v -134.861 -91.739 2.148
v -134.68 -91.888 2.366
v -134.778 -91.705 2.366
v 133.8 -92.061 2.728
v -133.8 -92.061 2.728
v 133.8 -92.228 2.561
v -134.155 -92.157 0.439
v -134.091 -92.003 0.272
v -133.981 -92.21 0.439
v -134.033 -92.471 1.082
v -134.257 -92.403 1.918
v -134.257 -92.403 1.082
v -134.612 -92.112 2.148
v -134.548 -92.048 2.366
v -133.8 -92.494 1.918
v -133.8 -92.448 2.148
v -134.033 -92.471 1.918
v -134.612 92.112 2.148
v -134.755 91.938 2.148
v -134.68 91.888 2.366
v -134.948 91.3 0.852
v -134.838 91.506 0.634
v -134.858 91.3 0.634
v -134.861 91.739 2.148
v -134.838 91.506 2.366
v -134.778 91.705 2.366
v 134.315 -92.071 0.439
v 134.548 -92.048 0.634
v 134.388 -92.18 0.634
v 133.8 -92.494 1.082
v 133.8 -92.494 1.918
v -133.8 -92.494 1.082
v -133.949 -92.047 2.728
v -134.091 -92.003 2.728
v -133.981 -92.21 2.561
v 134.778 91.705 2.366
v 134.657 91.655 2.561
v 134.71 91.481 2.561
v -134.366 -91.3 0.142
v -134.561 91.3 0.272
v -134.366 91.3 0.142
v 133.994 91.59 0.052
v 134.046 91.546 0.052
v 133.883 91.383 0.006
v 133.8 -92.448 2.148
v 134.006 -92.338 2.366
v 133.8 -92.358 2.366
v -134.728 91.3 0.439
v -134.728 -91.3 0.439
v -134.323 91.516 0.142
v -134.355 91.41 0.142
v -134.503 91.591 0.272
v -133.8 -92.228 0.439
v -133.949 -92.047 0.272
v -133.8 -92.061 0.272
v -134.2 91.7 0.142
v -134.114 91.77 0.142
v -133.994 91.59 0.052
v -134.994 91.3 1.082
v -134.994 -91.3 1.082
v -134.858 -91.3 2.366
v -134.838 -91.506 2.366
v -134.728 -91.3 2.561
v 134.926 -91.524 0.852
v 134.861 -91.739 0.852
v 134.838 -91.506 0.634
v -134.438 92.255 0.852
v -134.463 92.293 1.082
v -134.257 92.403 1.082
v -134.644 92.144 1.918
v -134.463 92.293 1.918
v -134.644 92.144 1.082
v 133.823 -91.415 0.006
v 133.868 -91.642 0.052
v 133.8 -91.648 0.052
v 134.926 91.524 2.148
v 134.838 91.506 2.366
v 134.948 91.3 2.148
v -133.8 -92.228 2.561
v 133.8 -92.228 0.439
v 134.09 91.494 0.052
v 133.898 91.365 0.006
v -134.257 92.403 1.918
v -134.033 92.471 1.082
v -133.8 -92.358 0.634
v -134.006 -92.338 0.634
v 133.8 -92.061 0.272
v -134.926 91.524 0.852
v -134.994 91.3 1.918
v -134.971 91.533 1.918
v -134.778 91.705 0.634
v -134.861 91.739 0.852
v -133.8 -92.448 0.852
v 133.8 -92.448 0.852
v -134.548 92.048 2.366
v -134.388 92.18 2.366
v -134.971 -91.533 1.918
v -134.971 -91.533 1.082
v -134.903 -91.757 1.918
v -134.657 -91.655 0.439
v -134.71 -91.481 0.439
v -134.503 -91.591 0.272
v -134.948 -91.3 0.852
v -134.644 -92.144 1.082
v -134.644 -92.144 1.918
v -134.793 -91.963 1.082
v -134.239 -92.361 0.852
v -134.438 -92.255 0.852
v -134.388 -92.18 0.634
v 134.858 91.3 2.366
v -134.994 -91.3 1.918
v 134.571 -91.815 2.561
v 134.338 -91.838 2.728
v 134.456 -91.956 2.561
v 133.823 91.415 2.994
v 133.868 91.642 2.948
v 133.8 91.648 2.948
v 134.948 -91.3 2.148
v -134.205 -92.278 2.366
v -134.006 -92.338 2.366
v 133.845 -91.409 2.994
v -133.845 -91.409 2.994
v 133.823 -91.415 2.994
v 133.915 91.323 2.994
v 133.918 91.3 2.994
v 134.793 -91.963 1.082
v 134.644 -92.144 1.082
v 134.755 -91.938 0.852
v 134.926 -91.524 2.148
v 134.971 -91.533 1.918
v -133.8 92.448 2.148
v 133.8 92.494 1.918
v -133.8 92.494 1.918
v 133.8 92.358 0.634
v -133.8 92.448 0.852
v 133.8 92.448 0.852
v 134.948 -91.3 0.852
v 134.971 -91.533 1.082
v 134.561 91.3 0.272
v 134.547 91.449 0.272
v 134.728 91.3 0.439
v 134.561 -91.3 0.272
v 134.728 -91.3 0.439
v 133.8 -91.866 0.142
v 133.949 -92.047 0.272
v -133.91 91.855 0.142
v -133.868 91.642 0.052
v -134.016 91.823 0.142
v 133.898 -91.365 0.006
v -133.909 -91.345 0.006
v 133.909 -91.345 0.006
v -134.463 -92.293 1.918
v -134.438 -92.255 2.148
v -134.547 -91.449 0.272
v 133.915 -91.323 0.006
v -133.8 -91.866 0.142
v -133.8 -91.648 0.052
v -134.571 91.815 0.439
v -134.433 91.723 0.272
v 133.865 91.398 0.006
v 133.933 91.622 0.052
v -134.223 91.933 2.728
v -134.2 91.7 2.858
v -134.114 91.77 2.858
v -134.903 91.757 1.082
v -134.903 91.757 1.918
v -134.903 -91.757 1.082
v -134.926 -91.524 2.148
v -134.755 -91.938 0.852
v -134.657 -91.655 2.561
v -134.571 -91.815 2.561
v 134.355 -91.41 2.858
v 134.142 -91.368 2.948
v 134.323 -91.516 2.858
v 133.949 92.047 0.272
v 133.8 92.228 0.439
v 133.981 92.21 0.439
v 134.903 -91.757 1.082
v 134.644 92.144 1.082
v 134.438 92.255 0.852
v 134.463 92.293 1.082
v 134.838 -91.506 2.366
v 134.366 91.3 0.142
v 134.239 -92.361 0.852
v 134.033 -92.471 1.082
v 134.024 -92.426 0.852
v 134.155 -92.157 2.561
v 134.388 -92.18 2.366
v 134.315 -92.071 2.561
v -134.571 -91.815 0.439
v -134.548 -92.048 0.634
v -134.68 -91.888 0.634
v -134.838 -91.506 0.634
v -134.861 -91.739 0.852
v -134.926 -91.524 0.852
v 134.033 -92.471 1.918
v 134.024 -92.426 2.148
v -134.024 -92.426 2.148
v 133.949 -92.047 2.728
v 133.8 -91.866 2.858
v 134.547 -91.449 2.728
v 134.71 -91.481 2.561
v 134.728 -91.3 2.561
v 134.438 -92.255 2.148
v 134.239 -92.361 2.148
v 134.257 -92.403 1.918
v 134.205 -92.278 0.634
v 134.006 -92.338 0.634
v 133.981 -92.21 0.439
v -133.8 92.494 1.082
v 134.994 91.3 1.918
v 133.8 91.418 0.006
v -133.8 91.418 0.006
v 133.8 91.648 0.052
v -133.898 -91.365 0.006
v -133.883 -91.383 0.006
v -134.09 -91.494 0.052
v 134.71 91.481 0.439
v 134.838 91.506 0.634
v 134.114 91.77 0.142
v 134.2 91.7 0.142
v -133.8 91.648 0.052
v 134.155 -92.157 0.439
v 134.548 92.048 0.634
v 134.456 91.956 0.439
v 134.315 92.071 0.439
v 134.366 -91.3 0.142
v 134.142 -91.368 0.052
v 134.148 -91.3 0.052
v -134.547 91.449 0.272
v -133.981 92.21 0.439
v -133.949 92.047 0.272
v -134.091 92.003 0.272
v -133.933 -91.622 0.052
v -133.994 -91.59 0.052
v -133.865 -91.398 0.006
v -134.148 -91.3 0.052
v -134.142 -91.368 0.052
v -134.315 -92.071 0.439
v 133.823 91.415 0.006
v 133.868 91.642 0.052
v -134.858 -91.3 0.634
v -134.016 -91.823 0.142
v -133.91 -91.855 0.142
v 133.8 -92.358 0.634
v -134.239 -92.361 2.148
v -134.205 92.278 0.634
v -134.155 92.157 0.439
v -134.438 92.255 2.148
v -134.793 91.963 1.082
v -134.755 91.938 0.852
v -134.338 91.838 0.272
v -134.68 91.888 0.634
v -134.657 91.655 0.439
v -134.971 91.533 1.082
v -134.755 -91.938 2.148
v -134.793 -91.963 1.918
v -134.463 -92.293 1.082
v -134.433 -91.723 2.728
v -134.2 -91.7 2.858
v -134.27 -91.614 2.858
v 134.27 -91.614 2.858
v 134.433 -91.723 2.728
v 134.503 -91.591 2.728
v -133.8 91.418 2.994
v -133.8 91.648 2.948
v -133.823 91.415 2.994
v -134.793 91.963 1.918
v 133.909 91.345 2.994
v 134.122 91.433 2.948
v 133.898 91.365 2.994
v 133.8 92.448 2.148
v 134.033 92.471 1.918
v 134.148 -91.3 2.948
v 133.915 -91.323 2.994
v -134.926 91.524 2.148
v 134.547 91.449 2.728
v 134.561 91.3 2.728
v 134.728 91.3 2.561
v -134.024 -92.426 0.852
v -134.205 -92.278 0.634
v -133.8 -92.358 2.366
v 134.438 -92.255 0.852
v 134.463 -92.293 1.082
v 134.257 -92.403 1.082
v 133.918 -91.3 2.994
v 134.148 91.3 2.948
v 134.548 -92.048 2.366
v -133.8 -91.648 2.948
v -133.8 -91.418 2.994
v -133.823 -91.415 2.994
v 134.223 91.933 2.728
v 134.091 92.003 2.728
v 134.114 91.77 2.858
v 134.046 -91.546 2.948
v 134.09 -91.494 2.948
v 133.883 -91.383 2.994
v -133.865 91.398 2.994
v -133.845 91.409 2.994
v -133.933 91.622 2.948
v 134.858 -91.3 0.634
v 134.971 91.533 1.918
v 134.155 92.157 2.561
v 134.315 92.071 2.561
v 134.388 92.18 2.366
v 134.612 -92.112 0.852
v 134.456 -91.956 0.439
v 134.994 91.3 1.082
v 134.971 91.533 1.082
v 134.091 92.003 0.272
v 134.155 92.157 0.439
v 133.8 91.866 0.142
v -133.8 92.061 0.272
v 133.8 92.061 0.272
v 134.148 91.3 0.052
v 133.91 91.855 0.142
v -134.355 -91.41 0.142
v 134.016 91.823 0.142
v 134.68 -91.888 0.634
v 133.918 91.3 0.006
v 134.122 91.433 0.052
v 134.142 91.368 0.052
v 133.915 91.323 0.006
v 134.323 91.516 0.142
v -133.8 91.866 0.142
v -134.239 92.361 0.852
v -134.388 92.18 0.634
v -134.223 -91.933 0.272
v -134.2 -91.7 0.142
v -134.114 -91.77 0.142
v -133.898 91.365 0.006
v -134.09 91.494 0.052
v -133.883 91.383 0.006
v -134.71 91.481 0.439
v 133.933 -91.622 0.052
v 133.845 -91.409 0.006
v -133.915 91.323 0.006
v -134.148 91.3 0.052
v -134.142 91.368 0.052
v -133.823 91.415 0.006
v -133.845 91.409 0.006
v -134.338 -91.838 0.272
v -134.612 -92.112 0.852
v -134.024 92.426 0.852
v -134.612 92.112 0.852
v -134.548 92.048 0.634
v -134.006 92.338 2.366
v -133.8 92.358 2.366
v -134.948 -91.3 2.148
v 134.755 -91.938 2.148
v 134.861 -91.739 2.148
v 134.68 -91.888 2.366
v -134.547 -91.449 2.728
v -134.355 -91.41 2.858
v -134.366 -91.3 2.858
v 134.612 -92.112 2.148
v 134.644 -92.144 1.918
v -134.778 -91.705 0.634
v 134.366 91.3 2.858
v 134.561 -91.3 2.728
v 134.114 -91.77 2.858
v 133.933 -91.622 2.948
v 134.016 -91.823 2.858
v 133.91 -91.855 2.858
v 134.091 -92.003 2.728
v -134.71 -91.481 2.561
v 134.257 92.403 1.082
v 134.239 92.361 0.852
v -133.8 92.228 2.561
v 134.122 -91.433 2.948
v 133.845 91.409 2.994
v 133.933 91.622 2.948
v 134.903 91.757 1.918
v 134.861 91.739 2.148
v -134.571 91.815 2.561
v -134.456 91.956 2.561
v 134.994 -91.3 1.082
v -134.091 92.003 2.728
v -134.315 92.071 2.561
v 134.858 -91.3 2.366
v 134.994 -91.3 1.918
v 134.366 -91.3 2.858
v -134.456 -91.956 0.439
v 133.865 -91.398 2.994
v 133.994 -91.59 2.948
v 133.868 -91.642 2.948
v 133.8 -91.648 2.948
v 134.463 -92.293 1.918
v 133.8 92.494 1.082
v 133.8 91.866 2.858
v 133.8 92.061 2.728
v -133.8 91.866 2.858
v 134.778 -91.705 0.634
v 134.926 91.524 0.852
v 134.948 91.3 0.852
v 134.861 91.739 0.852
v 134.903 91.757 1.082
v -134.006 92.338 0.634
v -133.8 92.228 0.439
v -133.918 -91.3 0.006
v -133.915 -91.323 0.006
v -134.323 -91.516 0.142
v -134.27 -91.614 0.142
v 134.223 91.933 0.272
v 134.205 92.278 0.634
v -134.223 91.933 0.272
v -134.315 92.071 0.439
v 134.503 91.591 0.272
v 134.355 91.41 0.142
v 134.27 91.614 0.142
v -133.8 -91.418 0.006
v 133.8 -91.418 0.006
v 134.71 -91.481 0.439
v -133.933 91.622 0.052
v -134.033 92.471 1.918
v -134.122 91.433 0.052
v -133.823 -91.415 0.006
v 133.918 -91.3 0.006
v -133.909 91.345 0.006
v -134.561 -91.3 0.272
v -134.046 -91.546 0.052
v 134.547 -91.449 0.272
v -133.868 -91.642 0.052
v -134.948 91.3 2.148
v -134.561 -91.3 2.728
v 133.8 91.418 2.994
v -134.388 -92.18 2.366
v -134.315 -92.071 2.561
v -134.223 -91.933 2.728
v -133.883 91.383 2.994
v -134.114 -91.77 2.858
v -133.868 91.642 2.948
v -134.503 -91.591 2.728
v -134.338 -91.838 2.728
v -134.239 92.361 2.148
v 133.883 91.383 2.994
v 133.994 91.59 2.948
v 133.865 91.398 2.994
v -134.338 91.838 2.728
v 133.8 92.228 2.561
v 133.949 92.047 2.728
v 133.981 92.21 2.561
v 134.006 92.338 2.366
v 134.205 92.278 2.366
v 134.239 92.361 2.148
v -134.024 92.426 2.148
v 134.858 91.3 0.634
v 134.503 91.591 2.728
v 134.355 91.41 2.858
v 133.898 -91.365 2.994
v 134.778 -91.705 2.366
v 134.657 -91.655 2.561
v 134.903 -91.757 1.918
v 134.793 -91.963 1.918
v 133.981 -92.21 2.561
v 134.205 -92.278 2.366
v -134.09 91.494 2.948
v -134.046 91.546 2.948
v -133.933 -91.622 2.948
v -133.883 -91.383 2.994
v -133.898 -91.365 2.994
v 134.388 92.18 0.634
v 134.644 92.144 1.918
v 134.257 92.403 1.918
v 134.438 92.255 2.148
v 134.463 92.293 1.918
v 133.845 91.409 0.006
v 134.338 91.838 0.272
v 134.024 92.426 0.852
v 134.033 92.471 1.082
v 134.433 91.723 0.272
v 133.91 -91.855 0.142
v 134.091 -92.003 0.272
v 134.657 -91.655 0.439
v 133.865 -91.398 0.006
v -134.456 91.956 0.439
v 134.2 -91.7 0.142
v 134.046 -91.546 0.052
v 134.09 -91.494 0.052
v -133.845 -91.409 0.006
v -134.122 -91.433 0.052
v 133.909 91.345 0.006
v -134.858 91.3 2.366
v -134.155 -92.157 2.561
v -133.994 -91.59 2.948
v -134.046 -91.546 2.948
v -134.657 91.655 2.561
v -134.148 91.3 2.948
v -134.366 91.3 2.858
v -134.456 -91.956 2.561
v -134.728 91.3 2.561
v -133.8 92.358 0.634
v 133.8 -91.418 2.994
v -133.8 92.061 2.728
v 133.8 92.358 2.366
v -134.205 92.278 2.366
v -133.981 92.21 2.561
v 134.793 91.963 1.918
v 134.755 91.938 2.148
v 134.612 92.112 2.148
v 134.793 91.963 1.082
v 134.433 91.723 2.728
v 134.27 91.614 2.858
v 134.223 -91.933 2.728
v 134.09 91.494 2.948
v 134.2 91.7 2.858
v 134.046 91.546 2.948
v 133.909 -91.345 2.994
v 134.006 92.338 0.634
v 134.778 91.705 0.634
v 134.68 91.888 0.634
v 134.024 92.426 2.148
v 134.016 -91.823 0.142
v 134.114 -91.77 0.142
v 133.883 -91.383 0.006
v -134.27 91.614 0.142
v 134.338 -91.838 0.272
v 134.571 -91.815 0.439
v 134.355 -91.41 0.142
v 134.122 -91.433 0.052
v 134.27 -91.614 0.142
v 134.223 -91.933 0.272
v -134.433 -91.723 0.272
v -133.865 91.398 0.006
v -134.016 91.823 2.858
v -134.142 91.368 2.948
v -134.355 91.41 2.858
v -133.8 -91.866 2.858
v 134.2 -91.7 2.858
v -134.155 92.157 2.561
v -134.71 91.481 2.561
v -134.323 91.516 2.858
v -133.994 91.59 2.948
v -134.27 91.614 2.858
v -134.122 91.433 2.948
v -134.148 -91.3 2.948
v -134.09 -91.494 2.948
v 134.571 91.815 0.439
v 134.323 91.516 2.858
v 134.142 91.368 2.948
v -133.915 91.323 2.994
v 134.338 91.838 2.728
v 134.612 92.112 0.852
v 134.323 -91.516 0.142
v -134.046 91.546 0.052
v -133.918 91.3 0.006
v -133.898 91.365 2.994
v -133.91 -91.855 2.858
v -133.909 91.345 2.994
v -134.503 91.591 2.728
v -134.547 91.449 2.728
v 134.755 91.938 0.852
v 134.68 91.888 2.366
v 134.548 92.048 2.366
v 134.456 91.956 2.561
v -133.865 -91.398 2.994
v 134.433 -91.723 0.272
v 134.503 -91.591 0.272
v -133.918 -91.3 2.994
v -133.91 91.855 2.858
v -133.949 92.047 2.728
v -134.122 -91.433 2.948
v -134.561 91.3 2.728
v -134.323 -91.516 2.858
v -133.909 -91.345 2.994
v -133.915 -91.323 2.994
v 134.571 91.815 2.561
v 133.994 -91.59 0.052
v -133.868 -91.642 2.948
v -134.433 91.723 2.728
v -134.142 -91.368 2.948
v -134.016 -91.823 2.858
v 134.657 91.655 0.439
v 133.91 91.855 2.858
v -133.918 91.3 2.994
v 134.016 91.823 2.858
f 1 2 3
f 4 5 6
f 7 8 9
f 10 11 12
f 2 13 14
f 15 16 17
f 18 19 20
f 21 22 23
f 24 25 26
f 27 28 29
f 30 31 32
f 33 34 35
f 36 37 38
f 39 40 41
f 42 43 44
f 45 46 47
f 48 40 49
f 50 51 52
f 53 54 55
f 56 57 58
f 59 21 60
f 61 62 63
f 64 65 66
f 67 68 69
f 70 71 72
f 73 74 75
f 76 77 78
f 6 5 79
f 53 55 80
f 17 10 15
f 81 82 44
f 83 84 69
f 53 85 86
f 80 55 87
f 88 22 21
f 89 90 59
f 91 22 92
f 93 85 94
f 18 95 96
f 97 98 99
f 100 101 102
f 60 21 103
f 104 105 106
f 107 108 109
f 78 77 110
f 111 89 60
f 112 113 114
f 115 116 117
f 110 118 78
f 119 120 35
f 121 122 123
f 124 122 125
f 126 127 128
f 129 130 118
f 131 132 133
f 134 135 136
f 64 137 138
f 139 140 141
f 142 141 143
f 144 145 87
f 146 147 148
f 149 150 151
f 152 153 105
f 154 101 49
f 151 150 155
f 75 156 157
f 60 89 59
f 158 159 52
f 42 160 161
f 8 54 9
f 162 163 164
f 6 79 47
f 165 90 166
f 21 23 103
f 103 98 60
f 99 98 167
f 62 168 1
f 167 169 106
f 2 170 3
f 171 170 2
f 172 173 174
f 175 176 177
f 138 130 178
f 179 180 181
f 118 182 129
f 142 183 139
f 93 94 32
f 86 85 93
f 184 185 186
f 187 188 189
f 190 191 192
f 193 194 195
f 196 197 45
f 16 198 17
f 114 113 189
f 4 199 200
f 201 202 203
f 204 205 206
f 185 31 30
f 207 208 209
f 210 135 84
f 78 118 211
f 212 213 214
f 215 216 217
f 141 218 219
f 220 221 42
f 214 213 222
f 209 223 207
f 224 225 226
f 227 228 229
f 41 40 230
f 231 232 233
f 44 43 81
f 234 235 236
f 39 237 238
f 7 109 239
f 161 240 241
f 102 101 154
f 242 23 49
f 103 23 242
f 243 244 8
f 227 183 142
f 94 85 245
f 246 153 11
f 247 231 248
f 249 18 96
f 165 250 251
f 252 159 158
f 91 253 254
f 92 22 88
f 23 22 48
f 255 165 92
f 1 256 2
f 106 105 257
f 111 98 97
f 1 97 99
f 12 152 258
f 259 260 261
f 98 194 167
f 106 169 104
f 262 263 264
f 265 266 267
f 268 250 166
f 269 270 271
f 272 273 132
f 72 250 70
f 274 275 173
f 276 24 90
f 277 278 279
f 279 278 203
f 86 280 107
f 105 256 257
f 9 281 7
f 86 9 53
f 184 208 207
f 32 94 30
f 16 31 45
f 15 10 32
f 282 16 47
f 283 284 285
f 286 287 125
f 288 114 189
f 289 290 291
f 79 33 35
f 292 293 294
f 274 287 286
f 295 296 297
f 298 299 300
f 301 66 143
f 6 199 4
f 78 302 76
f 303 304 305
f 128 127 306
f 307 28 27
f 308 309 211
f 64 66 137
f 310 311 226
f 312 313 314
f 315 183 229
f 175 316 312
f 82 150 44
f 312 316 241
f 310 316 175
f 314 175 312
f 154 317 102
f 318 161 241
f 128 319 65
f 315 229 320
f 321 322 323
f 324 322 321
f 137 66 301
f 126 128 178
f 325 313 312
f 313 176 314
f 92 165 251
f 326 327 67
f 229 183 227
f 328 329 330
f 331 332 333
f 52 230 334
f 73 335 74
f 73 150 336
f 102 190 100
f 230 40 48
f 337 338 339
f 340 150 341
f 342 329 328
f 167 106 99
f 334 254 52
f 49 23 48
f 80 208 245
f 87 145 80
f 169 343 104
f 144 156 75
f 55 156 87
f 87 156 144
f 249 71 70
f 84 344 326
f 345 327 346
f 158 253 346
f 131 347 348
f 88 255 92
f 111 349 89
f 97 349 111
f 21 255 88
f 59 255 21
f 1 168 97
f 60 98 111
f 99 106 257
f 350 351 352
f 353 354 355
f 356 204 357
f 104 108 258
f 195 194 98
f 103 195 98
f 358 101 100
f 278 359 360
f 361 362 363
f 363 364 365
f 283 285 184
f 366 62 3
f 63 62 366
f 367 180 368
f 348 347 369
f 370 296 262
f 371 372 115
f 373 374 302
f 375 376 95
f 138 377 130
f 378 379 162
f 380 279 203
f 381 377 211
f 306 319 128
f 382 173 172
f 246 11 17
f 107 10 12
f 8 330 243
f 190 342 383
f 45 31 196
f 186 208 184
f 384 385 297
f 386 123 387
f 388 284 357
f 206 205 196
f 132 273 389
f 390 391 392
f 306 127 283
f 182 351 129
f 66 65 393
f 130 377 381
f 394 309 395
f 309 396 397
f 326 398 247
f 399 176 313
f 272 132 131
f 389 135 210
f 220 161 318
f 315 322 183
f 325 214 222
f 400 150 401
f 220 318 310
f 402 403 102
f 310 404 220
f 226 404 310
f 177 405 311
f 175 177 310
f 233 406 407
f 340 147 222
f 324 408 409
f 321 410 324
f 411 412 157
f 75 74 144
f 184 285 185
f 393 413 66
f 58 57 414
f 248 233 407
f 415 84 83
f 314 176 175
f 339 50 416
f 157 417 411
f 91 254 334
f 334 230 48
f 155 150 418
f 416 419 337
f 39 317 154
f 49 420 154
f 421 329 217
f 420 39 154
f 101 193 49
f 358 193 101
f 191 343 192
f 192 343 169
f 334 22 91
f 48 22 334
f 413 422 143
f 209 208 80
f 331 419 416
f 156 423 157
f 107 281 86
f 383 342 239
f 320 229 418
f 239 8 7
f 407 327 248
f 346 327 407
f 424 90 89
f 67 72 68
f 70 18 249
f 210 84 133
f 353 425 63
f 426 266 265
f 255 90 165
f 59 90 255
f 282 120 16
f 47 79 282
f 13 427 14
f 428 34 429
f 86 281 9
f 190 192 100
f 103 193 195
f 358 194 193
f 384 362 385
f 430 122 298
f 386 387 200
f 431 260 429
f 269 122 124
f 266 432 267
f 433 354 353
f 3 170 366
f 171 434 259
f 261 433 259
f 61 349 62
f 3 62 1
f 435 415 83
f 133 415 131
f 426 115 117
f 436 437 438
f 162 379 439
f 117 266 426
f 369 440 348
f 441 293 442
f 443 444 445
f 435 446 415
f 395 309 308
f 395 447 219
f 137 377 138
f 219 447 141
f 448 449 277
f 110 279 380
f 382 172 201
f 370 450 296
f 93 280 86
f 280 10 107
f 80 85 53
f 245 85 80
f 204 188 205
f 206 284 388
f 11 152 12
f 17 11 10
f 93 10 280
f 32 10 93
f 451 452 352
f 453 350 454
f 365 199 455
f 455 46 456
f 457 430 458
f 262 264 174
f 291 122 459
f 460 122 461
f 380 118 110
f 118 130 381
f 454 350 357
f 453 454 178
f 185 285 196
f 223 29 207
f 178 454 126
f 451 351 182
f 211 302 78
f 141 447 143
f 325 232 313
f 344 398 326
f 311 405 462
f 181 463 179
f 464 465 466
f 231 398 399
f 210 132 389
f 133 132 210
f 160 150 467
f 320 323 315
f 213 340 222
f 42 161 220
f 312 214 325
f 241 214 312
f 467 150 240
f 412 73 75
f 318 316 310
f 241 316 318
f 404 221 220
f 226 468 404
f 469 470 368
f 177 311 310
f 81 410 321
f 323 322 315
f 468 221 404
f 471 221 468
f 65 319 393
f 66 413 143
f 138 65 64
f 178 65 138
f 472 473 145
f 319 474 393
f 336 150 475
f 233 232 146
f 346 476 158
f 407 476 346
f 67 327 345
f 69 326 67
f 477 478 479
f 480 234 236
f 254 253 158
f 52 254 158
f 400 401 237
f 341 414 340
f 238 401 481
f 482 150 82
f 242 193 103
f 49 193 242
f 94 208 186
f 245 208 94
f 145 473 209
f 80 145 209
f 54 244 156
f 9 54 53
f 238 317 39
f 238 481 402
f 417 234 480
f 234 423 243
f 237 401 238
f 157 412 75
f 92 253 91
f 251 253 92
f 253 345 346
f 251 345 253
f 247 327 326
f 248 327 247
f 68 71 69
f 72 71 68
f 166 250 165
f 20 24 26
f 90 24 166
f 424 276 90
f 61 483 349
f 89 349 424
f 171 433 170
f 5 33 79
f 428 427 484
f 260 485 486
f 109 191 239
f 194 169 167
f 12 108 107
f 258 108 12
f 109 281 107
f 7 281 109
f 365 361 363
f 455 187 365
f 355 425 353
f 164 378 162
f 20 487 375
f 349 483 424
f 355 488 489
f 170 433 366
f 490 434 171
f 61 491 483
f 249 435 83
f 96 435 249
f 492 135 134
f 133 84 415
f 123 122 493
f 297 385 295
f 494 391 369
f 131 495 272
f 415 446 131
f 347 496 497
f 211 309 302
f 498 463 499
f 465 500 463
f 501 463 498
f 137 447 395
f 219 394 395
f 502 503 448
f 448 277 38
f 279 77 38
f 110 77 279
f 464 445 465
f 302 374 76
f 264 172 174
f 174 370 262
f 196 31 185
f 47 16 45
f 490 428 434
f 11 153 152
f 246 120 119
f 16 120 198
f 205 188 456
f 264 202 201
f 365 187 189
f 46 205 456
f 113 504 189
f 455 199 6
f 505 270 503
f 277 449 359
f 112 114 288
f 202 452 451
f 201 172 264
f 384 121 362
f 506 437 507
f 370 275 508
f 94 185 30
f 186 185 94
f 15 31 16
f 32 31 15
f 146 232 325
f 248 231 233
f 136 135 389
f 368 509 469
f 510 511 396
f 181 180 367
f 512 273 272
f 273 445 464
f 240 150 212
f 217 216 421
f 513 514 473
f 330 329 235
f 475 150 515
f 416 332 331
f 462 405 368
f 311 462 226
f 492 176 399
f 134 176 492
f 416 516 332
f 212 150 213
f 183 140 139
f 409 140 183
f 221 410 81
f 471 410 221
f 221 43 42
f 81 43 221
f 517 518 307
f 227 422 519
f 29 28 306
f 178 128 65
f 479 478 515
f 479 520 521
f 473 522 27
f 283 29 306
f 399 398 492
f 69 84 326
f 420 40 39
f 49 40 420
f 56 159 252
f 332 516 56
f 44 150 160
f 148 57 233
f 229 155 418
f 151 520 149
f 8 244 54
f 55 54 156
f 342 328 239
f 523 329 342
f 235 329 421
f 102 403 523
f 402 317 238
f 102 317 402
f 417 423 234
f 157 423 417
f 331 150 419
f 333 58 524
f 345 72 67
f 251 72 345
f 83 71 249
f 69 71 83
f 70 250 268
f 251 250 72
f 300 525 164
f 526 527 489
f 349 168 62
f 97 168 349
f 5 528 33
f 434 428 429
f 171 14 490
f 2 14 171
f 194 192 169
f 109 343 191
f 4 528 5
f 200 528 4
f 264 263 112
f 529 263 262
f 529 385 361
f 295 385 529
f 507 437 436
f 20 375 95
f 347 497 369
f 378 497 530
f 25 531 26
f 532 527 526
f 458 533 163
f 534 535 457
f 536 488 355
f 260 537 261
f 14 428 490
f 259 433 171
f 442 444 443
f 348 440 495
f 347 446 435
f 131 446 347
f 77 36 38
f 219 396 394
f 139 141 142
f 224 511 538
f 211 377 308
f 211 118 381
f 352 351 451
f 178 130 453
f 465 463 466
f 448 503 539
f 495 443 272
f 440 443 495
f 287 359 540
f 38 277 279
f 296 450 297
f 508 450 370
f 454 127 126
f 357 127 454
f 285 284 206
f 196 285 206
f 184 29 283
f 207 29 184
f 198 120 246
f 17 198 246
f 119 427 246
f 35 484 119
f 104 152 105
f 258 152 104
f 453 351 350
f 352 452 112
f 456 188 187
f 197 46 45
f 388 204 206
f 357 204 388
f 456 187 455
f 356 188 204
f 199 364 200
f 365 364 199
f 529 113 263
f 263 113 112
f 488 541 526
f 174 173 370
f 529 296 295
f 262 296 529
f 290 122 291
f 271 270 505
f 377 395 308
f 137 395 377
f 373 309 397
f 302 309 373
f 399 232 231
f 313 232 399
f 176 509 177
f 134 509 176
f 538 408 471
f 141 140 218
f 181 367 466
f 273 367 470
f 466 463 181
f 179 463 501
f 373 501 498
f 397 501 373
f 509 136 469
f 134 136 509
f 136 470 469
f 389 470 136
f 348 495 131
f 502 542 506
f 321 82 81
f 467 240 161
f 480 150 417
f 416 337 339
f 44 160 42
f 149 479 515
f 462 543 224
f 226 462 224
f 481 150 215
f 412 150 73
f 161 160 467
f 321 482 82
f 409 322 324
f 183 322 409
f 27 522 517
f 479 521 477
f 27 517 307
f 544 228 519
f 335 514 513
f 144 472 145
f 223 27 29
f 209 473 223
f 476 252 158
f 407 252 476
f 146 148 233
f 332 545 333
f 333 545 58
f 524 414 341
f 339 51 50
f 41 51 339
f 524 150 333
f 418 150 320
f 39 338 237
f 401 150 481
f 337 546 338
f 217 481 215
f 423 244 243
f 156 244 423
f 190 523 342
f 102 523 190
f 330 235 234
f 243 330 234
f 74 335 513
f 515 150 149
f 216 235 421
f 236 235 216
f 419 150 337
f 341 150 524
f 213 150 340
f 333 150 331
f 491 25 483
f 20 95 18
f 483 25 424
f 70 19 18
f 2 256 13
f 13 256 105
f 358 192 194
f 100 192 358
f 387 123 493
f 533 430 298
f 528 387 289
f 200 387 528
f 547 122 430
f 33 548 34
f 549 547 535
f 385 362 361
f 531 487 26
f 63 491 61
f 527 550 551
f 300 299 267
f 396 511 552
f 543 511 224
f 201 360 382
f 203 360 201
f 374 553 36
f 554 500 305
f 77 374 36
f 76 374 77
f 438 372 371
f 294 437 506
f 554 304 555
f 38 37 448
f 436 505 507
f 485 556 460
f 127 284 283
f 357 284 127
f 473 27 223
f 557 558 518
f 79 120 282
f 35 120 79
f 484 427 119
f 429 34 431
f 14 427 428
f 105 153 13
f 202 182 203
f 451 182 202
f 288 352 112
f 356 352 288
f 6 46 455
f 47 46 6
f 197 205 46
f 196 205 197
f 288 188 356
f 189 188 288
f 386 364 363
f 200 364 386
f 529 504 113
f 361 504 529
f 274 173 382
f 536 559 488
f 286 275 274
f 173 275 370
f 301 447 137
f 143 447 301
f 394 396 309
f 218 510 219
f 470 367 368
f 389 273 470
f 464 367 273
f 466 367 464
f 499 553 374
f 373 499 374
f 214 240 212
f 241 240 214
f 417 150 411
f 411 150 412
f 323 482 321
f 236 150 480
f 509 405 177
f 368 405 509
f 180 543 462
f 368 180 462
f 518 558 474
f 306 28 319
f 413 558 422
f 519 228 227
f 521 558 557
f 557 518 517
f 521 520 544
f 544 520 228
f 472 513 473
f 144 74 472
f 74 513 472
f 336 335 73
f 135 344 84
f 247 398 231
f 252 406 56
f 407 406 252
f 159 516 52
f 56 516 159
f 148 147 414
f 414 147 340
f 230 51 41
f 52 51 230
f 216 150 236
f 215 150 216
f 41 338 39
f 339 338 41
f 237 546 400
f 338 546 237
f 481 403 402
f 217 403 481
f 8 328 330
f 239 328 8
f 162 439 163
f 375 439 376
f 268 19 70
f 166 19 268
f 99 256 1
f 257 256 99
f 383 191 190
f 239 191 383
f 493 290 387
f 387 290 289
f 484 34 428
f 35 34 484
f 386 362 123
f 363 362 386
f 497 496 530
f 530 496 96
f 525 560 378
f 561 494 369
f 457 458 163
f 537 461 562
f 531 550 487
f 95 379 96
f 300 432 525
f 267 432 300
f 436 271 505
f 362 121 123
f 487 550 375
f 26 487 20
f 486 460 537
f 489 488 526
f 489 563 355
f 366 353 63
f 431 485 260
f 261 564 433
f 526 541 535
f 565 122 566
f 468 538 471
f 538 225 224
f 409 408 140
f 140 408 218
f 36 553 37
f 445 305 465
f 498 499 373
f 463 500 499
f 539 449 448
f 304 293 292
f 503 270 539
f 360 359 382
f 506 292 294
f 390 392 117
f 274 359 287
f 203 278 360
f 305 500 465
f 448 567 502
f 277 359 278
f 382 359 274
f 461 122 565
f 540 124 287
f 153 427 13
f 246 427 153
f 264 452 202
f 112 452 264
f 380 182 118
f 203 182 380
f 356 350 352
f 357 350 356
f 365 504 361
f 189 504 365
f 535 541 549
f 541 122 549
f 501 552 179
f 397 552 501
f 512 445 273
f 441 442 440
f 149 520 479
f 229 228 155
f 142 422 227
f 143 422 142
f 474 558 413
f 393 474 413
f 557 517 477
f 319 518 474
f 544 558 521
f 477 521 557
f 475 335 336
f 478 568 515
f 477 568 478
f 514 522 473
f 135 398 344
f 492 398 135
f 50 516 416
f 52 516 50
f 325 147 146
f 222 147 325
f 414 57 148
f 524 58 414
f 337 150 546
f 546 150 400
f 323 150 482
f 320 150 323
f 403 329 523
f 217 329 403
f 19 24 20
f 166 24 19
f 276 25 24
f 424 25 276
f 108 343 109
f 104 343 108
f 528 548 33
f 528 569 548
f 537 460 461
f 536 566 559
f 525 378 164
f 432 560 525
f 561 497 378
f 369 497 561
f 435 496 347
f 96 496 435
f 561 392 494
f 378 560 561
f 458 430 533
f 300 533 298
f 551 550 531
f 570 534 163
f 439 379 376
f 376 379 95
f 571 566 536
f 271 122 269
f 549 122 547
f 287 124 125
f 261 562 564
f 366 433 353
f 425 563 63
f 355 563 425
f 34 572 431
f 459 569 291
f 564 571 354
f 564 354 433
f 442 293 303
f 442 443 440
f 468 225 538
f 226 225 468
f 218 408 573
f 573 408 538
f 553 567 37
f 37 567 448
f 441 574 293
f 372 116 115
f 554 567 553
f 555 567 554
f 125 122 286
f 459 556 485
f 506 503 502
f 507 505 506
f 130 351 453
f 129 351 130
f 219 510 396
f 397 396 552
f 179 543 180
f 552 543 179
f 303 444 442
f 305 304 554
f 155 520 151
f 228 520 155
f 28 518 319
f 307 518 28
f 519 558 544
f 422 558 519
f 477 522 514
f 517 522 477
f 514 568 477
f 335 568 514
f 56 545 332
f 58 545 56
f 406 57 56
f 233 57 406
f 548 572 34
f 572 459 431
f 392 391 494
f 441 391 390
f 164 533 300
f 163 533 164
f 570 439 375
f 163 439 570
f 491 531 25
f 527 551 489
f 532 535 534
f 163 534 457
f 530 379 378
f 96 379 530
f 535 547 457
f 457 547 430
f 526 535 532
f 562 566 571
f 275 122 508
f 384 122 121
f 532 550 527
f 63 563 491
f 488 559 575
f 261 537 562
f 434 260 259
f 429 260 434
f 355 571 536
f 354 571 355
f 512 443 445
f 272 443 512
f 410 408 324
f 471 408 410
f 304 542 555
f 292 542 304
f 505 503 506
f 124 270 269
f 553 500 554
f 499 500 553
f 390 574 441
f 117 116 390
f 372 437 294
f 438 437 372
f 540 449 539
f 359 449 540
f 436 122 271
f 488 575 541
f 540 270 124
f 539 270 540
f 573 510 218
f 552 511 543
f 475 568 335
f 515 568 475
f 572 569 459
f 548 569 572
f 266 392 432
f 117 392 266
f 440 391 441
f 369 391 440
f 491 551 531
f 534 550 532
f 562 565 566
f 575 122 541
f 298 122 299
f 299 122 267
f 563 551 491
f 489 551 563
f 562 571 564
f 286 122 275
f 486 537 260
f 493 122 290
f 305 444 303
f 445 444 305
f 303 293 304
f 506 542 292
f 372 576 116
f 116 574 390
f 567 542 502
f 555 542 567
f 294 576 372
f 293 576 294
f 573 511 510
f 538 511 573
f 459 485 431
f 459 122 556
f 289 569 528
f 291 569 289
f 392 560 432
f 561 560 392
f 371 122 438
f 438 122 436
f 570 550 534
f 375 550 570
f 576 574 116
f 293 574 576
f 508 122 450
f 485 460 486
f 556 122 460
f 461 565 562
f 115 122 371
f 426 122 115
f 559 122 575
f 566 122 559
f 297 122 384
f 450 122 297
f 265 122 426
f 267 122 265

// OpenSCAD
// 2WD Car Chassis (2WD 小車底盤) visual source for NexCAD.
// Units: millimeters. Origin: part bottom-center, matching src/parts/library.ts.
// This generated baseline is intentionally simple; refine it with measured details before exporting STL.

$fn = 32;

module rounded_box(size, r = 0.8) {
  hull() {
    for (x = [-size[0] / 2 + r, size[0] / 2 - r])
      for (y = [-size[1] / 2 + r, size[1] / 2 - r]) {
        translate([x, y, r]) sphere(r = r);
        translate([x, y, size[2] - r]) sphere(r = r);
      }
  }
}

color("#2e7d5b") rounded_box([270, 185, 3], min(1.2, min(270, 185) / 8));
